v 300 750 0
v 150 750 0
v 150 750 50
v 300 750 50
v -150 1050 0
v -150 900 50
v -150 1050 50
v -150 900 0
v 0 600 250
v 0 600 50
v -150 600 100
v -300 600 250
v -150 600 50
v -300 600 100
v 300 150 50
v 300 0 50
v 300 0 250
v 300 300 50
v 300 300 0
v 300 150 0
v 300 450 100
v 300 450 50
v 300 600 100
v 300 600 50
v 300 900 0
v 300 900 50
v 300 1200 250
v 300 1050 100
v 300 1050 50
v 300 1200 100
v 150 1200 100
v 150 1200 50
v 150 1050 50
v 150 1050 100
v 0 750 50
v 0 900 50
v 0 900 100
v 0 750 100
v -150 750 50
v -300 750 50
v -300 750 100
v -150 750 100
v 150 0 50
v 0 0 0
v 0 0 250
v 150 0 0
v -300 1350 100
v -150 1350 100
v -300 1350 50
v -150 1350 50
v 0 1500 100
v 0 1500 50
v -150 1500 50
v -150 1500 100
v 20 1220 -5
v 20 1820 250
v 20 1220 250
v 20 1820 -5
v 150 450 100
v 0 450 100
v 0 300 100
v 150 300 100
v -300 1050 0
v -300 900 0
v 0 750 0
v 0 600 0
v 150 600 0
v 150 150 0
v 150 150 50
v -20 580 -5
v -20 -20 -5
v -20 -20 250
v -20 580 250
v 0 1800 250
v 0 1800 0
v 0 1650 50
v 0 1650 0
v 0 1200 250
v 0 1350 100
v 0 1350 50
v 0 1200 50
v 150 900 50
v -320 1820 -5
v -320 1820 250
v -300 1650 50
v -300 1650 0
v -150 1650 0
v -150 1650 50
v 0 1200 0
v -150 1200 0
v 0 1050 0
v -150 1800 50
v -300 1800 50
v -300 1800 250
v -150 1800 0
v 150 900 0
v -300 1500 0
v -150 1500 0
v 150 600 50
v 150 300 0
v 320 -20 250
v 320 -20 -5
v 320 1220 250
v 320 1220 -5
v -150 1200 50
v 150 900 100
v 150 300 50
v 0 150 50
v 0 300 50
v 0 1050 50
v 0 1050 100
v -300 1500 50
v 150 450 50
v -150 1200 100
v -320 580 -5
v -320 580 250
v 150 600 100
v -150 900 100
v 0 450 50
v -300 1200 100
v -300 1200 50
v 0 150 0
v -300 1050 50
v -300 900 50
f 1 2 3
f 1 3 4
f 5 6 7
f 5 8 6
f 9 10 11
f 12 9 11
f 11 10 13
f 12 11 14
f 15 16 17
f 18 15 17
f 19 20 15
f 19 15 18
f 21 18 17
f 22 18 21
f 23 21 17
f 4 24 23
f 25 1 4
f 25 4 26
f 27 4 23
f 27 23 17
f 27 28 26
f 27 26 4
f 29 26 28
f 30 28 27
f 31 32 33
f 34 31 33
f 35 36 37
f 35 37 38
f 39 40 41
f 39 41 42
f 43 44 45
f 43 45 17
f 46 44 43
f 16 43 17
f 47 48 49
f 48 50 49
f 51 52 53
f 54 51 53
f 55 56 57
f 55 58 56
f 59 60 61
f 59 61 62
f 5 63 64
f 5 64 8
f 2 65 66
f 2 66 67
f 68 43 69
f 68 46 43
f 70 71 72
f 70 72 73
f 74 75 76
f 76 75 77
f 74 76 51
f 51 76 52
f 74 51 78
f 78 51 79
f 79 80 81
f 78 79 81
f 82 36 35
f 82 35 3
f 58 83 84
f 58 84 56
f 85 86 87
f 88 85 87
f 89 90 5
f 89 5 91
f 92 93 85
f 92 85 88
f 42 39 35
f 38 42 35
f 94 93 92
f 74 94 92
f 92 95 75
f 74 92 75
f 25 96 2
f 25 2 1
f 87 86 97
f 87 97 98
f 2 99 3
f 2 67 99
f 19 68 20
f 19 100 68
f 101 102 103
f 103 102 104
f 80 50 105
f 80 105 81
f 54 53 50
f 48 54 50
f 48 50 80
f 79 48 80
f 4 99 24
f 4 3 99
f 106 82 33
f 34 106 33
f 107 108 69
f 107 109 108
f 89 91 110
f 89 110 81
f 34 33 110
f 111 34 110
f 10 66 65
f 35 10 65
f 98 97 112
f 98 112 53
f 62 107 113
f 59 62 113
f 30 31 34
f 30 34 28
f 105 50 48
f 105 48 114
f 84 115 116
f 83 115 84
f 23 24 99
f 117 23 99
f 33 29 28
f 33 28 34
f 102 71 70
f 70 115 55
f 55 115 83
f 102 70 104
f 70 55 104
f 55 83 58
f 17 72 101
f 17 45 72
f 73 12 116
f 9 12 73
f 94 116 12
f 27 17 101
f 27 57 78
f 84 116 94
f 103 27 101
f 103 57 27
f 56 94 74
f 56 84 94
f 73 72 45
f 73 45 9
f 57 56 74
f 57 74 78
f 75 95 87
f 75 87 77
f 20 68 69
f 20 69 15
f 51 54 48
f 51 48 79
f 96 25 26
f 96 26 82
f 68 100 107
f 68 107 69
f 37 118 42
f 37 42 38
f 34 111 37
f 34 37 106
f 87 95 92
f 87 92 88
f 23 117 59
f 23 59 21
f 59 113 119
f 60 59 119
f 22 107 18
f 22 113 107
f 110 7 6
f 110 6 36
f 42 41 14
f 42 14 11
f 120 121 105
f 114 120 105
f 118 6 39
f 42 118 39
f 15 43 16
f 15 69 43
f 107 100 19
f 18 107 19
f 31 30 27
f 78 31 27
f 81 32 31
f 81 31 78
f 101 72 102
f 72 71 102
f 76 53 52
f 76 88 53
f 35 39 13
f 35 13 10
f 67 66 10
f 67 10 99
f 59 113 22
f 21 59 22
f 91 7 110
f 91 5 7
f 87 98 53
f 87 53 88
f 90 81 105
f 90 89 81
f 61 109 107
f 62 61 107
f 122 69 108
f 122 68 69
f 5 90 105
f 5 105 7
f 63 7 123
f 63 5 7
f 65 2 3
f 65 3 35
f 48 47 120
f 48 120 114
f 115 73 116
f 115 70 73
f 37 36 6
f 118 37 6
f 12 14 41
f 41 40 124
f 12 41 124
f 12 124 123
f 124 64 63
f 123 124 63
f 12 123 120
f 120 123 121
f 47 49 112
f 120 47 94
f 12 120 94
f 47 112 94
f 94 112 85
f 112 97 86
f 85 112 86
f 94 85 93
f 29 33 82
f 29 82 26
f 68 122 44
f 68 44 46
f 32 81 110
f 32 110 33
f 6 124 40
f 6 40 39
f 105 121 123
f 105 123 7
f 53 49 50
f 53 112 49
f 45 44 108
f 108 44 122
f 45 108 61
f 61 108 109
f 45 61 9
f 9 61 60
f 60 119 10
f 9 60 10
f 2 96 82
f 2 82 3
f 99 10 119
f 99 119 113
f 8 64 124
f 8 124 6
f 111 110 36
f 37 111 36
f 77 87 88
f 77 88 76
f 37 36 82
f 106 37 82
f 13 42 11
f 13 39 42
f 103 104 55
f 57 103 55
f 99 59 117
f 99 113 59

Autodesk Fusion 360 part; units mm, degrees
sketch "Sketch1" plane through (0, 0, 0) normal (0, 0, 1) x (1, 0, 0)
  line L0 (0, 0) -> (300, 0)
  line L1 (300, 0) -> (300, 1200)
  line L2 (300, 1200) -> (0, 1200)
  line L3 (0, 600) -> (-300, 600)
  line L4 (-300, 600) -> (-300, 1800)
  line L5 (-300, 1800) -> (0, 1800)
  line L6 (0, 1800) -> (0, 1200)
  line L7 (0, 0) -> (0, 600)
  line L8 (20, 1820) -> (20, 1220)
  line L9 (320, 1220) -> (20, 1220)
  line L10 (320, -20) -> (320, 1220)
  line L11 (-20, -20) -> (320, -20)
  line L12 (-20, -20) -> (-20, 580)
  line L13 (-20, 580) -> (-320, 580)
  line L14 (-320, 580) -> (-320, 1820)
  line L15 (-320, 1820) -> (20, 1820)
  dimension "d1" = 300
  dimension "d2" = 1200
  dimension "d3" = 300
  dimension "d4" = 1200
  dimension "d5" = -20
extrude "Extrude1" add sketch "Sketch1" along normal blind 400 makes body 1
extrude "Extrude2" add sketch "Sketch1" against normal blind 5 separate body contours L0 L1 L2 L3 L4 L5 L6 L7 makes body 2
extrude "Extrude3" add sketch "Sketch1" against normal blind 5 bodies 1 2
extrude "Extrude4" cut 1 faces at (-313.3333, 1400, 400) along direction (0, 0, -1) blind 100 on bodies 1 bodies 1
extrude "Extrude5" cut 1 faces at (-313.3333, 1400, 300) along direction (0, 0, -1) blind 50 on bodies 1 bodies 1
sketch "Sketch2" plane through (0, 0, 0) normal (0, 0, 1) x (1, 0, 0)
  line L0 (0, 0) -> (150, 0)
  line L1 (150, 0) -> (150, 150)
  line L2 (150, 150) -> (0, 150)
  line L3 (0, 150) -> (0, 0)
  line L4 (150, 150) -> (300, 150)
  line L5 (300, 150) -> (300, 0)
  line L6 (300, 0) -> (150, 0)
  line L7 (0, 300) -> (150, 300)
  line L8 (0, 150) -> (0, 300)
  line L9 (150, 300) -> (150, 150)
  line L10 (300, 300) -> (150, 300)
  line L11 (300, 150) -> (300, 300)
  line L12 (150, 600) -> (150, 450)
  line L13 (150, 450) -> (0, 450)
  line L14 (150, 450) -> (300, 450)
  line L15 (150, 300) -> (150, 450)
  line L16 (0, 600) -> (150, 600)
  line L17 (0, 450) -> (0, 600)
  line L18 (300, 600) -> (150, 600)
  line L19 (0, 450) -> (0, 300)
  line L20 (300, 450) -> (300, 300)
  line L21 (300, 450) -> (300, 600)
  line L22 (0, 1200) -> (150, 1200)
  line L23 (0, 1050) -> (0, 900)
  line L24 (300, 1200) -> (150, 1200)
  line L25 (150, 900) -> (150, 1050)
  line L26 (150, 750) -> (0, 750)
  line L27 (0, 900) -> (150, 900)
  line L28 (300, 1050) -> (300, 1200)
  line L29 (150, 900) -> (150, 750)
  line L30 (0, 750) -> (0, 900)
  line L31 (300, 750) -> (300, 600)
  line L32 (150, 1050) -> (0, 1050)
  line L33 (150, 750) -> (300, 750)
  line L34 (300, 1050) -> (300, 900)
  line L35 (150, 1050) -> (300, 1050)
  line L36 (150, 600) -> (150, 750)
  line L37 (0, 1050) -> (0, 1200)
  line L38 (300, 900) -> (150, 900)
  line L39 (300, 750) -> (300, 900)
  line L40 (150, 1200) -> (150, 1050)
  line L41 (0, 750) -> (0, 600)
  line L42 (-150, 900) -> (-150, 750)
  line L43 (0, 900) -> (-150, 900)
  line L44 (-150, 750) -> (0, 750)
  line L45 (-150, 600) -> (-150, 750)
  line L46 (-150, 900) -> (-150, 1050)
  line L47 (-300, 1200) -> (-150, 1200)
  line L48 (-300, 750) -> (-300, 900)
  line L49 (-300, 1050) -> (-300, 1200)
  line L50 (-150, 1050) -> (0, 1050)
  line L51 (-150, 1050) -> (-300, 1050)
  line L52 (-300, 1050) -> (-300, 900)
  line L53 (0, 1200) -> (-150, 1200)
  line L54 (-150, 1200) -> (-150, 1050)
  line L55 (0, 600) -> (-150, 600)
  line L56 (-300, 900) -> (-150, 900)
  line L57 (-300, 750) -> (-300, 600)
  line L58 (-300, 600) -> (-150, 600)
  line L59 (-300, 1650) -> (-300, 1800)
  line L60 (-300, 1650) -> (-300, 1500)
  line L61 (0, 1650) -> (0, 1500)
  line L62 (-150, 1650) -> (0, 1650)
  line L63 (-150, 1500) -> (-150, 1650)
  line L64 (-300, 1350) -> (-300, 1500)
  line L65 (-150, 1500) -> (-150, 1350)
  line L66 (0, 1350) -> (0, 1500)
  line L67 (-150, 1350) -> (-300, 1350)
  line L68 (0, 1350) -> (0, 1200)
  line L69 (-300, 1350) -> (-300, 1200)
  line L70 (-150, 1800) -> (-150, 1650)
  line L71 (-300, 1500) -> (-150, 1500)
  line L72 (0, 1500) -> (-150, 1500)
  line L73 (-150, 1350) -> (0, 1350)
  line L74 (-300, 1800) -> (-150, 1800)
  line L75 (-150, 1200) -> (-150, 1350)
  line L76 (0, 1800) -> (-150, 1800)
  line L77 (0, 1650) -> (0, 1800)
  line L78 (-300, 750) -> (-150, 750)
  line L79 (-300, 1650) -> (-150, 1650)
  point P0 (0, 1200)
  point P1 (150, 600)
  point P2 (0, 900)
  point P3 (0, 600)
  point P4 (0, 750)
  point P5 (-150, 600)
  point P6 (-150, 750)
  point P7 (0, 1050)
  point P8 (0, 1350)
  point P9 (-150, 1200)
  point P10 (0, 1500)
  point P11 (-150, 1800)
  point P12 (-150, 1650)
  point P13 (0, 1200)
  point P14 (0, 1200)
  dimension "d16" = 150
  dimension "d17" = 150
extrude "Extrude6" add sketch "Sketch2" along normal blind 50 separate body contours L59 L70 L74 L79 makes body 3
extrude "Extrude7" add sketch "Sketch2" along normal blind 50 separate body contours L64 L65 L67 L71 makes body 4
extrude "Extrude8" add sketch "Sketch2" along normal blind 100 contours L47 L67 L69 L75 bodies 4
extrude "Extrude9" add sketch "Sketch2" along normal blind 50 contours L47 L49 L51 L54 bodies 4
extrude "Extrude10" add sketch "Sketch2" along normal blind 50 separate body contours L42 L48 L56 L78 makes body 5
extrude "Extrude11" add sketch "Sketch2" along normal blind 100 contours L45 L57 L58 L78 bodies 5
extrude "Extrude12" add sketch "Sketch2" along normal blind 50 separate body contours L61 L62 L63 L72 makes body 6
extrude "Extrude13" add sketch "Sketch2" along normal blind 100 contours L65 L66 L72 L73 bodies 6 4
extrude "Extrude14" add sketch "Sketch2" along normal blind 50 separate body contours L53 L68 L73 L75 makes body 7
extrude "Extrude15" add sketch "Sketch2" along normal blind 50 separate body contours L23 L43 L46 L50 makes body 8
extrude "Extrude16" add sketch "Sketch2" along normal blind 100 contours L30 L42 L43 L44 bodies 8 5
extrude "Extrude17" add sketch "Sketch2" along normal blind 50 separate body contours L41 L44 L45 L55 makes body 9
extrude "Extrude18" add sketch "Sketch2" along normal blind 50 separate body contours L22 L32 L37 L40 makes body 10
extrude "Extrude19" add sketch "Sketch2" along normal blind 100 contours L24 L28 L35 L40 bodies 10
extrude "Extrude20" add sketch "Sketch2" along normal blind 50 contours L25 L34 L35 L38 bodies 10
extrude "Extrude21" add sketch "Sketch2" along normal blind 50 separate body contours L18 L31 L33 L36 makes body 11
extrude "Extrude22" add sketch "Sketch2" along normal blind 100 contours L12 L14 L18 L21 bodies 11
extrude "Extrude23" add sketch "Sketch2" along normal blind 50 contours L10 L14 L15 L20 bodies 11
extrude "Extrude24" add sketch "Sketch2" along normal blind 50 separate body contours L1 L4 L5 L6 makes body 12
extrude "Extrude25" add sketch "Sketch2" along normal blind 100 separate body contours L23 L25 L27 L32 makes body 13
extrude "Extrude26" add sketch "Sketch2" along normal blind 50 contours L26 L27 L29 L30 bodies 13 8 9 10 11
extrude "Extrude27" add sketch "Sketch2" along normal blind 50 separate body contours L12 L13 L16 L17 makes body 14
extrude "Extrude28" add sketch "Sketch2" along normal blind 100 contours L7 L13 L15 L19 bodies 14 13
extrude "Extrude29" add sketch "Sketch2" along normal blind 50 separate body contours L2 L7 L8 L9 makes body 15
combine "Combine1" operation add target body 14 tool bodies 7 6 12 makes body 16 at (150, 400, 0)
combine "Combine2" operation add target body 14 tool bodies 1
combine "Combine3" operation add target body 3 tool bodies 14
combine "Combine4" operation add target body 3 tool bodies 15
combine "Combine5" operation add target body 3 tool bodies 16
